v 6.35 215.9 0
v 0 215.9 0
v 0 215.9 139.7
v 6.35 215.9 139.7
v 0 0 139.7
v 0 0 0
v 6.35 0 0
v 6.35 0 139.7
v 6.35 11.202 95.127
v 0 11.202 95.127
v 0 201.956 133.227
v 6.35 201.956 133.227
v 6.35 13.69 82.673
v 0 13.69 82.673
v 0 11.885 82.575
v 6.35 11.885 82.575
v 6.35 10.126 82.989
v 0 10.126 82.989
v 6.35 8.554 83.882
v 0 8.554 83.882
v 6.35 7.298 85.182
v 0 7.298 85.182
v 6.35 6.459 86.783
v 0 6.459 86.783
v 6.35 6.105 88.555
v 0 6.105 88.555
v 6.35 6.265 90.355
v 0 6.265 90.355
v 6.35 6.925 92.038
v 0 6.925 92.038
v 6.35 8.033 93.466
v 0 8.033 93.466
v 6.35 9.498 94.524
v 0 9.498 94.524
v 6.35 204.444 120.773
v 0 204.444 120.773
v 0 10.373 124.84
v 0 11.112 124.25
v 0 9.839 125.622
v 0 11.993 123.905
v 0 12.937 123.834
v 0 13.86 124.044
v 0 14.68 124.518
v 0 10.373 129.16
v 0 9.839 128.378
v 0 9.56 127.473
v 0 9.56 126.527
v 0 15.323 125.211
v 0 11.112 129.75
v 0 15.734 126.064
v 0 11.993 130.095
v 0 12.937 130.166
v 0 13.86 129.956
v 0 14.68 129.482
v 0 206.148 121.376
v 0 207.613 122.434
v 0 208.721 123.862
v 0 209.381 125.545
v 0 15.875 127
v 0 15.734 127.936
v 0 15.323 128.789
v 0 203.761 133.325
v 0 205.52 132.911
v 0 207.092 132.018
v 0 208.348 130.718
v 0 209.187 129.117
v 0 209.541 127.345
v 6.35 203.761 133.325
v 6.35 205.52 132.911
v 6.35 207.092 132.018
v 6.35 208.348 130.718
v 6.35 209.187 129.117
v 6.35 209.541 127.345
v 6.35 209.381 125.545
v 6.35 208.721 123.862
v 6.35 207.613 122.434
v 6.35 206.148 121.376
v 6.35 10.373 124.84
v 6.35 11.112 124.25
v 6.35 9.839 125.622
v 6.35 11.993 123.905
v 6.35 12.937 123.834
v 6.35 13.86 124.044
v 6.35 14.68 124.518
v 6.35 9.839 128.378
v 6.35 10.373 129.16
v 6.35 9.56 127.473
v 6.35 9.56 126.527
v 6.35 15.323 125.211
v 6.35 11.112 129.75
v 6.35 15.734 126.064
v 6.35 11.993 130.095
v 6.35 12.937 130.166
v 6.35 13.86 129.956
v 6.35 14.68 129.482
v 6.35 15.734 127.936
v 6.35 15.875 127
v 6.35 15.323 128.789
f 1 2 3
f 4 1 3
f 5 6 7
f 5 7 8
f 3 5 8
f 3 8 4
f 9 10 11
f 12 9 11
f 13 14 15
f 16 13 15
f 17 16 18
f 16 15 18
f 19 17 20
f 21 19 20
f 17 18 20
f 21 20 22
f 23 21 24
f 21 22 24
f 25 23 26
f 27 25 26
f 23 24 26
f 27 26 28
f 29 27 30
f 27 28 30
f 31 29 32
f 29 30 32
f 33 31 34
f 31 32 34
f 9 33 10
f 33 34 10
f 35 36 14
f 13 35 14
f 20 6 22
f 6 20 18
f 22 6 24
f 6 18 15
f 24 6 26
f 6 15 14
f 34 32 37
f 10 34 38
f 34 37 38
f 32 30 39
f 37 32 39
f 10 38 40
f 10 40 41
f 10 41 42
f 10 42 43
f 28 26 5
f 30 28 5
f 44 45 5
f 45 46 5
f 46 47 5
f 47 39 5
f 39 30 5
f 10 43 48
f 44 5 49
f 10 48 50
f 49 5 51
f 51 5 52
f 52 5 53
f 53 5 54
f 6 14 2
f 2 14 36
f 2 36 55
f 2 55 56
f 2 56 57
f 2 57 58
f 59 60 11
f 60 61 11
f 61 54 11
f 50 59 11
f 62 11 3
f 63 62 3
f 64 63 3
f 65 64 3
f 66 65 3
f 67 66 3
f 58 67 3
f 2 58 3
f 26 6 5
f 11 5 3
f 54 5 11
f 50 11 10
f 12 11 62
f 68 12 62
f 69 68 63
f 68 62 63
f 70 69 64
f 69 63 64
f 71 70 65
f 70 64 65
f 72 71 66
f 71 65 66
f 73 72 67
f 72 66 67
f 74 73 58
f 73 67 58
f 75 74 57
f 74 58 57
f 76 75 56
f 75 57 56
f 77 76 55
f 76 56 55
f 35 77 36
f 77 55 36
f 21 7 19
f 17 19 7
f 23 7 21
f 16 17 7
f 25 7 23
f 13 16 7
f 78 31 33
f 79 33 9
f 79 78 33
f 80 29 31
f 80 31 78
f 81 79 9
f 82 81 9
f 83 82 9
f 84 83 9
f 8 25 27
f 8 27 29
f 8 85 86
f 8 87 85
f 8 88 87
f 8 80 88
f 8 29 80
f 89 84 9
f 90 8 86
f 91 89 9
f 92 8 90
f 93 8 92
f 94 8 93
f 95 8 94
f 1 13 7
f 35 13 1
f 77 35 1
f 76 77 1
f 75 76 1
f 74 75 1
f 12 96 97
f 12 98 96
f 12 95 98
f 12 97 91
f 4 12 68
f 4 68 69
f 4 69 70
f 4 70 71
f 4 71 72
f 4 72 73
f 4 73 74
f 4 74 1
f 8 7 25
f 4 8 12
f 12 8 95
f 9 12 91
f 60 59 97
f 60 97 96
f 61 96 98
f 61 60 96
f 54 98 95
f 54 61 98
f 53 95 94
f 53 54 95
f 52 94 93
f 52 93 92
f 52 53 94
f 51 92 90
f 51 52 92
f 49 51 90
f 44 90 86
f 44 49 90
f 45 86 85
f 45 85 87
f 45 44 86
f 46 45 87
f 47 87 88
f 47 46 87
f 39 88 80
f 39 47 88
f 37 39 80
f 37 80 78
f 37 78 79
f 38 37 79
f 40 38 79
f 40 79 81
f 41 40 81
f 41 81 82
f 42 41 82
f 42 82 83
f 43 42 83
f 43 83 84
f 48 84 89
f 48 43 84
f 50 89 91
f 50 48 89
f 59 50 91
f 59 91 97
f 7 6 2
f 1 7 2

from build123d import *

# Parameters (mm, degrees)
F0_W     = 215.9
F0_H     = 139.7
F0_R     = 3.175
F1_DEPTH = 6.35


with BuildPart() as f1:
    # F0 (on Right) → F1 (new body)
    with BuildSketch(Plane.YZ):
        with Locations((107.95, 69.85)):
            Rectangle(F0_W, F0_H)
        with Locations((12.7, 127)):
            Circle(F0_R, mode=Mode.SUBTRACT)
        with BuildLine():
            Line((204.443743, 120.772994), (13.689743, 82.672994))
            ThreePointArc((13.689743, 82.672994), (6.218994, 87.656257), (11.202257, 95.127006))
            Line((11.202257, 95.127006), (201.956257, 133.227006))
            ThreePointArc((201.956257, 133.227006), (209.427006, 128.243743), (204.443743, 120.772994))
        make_face(mode=Mode.SUBTRACT)
    extrude(amount=F1_DEPTH)


solid = f1.part
